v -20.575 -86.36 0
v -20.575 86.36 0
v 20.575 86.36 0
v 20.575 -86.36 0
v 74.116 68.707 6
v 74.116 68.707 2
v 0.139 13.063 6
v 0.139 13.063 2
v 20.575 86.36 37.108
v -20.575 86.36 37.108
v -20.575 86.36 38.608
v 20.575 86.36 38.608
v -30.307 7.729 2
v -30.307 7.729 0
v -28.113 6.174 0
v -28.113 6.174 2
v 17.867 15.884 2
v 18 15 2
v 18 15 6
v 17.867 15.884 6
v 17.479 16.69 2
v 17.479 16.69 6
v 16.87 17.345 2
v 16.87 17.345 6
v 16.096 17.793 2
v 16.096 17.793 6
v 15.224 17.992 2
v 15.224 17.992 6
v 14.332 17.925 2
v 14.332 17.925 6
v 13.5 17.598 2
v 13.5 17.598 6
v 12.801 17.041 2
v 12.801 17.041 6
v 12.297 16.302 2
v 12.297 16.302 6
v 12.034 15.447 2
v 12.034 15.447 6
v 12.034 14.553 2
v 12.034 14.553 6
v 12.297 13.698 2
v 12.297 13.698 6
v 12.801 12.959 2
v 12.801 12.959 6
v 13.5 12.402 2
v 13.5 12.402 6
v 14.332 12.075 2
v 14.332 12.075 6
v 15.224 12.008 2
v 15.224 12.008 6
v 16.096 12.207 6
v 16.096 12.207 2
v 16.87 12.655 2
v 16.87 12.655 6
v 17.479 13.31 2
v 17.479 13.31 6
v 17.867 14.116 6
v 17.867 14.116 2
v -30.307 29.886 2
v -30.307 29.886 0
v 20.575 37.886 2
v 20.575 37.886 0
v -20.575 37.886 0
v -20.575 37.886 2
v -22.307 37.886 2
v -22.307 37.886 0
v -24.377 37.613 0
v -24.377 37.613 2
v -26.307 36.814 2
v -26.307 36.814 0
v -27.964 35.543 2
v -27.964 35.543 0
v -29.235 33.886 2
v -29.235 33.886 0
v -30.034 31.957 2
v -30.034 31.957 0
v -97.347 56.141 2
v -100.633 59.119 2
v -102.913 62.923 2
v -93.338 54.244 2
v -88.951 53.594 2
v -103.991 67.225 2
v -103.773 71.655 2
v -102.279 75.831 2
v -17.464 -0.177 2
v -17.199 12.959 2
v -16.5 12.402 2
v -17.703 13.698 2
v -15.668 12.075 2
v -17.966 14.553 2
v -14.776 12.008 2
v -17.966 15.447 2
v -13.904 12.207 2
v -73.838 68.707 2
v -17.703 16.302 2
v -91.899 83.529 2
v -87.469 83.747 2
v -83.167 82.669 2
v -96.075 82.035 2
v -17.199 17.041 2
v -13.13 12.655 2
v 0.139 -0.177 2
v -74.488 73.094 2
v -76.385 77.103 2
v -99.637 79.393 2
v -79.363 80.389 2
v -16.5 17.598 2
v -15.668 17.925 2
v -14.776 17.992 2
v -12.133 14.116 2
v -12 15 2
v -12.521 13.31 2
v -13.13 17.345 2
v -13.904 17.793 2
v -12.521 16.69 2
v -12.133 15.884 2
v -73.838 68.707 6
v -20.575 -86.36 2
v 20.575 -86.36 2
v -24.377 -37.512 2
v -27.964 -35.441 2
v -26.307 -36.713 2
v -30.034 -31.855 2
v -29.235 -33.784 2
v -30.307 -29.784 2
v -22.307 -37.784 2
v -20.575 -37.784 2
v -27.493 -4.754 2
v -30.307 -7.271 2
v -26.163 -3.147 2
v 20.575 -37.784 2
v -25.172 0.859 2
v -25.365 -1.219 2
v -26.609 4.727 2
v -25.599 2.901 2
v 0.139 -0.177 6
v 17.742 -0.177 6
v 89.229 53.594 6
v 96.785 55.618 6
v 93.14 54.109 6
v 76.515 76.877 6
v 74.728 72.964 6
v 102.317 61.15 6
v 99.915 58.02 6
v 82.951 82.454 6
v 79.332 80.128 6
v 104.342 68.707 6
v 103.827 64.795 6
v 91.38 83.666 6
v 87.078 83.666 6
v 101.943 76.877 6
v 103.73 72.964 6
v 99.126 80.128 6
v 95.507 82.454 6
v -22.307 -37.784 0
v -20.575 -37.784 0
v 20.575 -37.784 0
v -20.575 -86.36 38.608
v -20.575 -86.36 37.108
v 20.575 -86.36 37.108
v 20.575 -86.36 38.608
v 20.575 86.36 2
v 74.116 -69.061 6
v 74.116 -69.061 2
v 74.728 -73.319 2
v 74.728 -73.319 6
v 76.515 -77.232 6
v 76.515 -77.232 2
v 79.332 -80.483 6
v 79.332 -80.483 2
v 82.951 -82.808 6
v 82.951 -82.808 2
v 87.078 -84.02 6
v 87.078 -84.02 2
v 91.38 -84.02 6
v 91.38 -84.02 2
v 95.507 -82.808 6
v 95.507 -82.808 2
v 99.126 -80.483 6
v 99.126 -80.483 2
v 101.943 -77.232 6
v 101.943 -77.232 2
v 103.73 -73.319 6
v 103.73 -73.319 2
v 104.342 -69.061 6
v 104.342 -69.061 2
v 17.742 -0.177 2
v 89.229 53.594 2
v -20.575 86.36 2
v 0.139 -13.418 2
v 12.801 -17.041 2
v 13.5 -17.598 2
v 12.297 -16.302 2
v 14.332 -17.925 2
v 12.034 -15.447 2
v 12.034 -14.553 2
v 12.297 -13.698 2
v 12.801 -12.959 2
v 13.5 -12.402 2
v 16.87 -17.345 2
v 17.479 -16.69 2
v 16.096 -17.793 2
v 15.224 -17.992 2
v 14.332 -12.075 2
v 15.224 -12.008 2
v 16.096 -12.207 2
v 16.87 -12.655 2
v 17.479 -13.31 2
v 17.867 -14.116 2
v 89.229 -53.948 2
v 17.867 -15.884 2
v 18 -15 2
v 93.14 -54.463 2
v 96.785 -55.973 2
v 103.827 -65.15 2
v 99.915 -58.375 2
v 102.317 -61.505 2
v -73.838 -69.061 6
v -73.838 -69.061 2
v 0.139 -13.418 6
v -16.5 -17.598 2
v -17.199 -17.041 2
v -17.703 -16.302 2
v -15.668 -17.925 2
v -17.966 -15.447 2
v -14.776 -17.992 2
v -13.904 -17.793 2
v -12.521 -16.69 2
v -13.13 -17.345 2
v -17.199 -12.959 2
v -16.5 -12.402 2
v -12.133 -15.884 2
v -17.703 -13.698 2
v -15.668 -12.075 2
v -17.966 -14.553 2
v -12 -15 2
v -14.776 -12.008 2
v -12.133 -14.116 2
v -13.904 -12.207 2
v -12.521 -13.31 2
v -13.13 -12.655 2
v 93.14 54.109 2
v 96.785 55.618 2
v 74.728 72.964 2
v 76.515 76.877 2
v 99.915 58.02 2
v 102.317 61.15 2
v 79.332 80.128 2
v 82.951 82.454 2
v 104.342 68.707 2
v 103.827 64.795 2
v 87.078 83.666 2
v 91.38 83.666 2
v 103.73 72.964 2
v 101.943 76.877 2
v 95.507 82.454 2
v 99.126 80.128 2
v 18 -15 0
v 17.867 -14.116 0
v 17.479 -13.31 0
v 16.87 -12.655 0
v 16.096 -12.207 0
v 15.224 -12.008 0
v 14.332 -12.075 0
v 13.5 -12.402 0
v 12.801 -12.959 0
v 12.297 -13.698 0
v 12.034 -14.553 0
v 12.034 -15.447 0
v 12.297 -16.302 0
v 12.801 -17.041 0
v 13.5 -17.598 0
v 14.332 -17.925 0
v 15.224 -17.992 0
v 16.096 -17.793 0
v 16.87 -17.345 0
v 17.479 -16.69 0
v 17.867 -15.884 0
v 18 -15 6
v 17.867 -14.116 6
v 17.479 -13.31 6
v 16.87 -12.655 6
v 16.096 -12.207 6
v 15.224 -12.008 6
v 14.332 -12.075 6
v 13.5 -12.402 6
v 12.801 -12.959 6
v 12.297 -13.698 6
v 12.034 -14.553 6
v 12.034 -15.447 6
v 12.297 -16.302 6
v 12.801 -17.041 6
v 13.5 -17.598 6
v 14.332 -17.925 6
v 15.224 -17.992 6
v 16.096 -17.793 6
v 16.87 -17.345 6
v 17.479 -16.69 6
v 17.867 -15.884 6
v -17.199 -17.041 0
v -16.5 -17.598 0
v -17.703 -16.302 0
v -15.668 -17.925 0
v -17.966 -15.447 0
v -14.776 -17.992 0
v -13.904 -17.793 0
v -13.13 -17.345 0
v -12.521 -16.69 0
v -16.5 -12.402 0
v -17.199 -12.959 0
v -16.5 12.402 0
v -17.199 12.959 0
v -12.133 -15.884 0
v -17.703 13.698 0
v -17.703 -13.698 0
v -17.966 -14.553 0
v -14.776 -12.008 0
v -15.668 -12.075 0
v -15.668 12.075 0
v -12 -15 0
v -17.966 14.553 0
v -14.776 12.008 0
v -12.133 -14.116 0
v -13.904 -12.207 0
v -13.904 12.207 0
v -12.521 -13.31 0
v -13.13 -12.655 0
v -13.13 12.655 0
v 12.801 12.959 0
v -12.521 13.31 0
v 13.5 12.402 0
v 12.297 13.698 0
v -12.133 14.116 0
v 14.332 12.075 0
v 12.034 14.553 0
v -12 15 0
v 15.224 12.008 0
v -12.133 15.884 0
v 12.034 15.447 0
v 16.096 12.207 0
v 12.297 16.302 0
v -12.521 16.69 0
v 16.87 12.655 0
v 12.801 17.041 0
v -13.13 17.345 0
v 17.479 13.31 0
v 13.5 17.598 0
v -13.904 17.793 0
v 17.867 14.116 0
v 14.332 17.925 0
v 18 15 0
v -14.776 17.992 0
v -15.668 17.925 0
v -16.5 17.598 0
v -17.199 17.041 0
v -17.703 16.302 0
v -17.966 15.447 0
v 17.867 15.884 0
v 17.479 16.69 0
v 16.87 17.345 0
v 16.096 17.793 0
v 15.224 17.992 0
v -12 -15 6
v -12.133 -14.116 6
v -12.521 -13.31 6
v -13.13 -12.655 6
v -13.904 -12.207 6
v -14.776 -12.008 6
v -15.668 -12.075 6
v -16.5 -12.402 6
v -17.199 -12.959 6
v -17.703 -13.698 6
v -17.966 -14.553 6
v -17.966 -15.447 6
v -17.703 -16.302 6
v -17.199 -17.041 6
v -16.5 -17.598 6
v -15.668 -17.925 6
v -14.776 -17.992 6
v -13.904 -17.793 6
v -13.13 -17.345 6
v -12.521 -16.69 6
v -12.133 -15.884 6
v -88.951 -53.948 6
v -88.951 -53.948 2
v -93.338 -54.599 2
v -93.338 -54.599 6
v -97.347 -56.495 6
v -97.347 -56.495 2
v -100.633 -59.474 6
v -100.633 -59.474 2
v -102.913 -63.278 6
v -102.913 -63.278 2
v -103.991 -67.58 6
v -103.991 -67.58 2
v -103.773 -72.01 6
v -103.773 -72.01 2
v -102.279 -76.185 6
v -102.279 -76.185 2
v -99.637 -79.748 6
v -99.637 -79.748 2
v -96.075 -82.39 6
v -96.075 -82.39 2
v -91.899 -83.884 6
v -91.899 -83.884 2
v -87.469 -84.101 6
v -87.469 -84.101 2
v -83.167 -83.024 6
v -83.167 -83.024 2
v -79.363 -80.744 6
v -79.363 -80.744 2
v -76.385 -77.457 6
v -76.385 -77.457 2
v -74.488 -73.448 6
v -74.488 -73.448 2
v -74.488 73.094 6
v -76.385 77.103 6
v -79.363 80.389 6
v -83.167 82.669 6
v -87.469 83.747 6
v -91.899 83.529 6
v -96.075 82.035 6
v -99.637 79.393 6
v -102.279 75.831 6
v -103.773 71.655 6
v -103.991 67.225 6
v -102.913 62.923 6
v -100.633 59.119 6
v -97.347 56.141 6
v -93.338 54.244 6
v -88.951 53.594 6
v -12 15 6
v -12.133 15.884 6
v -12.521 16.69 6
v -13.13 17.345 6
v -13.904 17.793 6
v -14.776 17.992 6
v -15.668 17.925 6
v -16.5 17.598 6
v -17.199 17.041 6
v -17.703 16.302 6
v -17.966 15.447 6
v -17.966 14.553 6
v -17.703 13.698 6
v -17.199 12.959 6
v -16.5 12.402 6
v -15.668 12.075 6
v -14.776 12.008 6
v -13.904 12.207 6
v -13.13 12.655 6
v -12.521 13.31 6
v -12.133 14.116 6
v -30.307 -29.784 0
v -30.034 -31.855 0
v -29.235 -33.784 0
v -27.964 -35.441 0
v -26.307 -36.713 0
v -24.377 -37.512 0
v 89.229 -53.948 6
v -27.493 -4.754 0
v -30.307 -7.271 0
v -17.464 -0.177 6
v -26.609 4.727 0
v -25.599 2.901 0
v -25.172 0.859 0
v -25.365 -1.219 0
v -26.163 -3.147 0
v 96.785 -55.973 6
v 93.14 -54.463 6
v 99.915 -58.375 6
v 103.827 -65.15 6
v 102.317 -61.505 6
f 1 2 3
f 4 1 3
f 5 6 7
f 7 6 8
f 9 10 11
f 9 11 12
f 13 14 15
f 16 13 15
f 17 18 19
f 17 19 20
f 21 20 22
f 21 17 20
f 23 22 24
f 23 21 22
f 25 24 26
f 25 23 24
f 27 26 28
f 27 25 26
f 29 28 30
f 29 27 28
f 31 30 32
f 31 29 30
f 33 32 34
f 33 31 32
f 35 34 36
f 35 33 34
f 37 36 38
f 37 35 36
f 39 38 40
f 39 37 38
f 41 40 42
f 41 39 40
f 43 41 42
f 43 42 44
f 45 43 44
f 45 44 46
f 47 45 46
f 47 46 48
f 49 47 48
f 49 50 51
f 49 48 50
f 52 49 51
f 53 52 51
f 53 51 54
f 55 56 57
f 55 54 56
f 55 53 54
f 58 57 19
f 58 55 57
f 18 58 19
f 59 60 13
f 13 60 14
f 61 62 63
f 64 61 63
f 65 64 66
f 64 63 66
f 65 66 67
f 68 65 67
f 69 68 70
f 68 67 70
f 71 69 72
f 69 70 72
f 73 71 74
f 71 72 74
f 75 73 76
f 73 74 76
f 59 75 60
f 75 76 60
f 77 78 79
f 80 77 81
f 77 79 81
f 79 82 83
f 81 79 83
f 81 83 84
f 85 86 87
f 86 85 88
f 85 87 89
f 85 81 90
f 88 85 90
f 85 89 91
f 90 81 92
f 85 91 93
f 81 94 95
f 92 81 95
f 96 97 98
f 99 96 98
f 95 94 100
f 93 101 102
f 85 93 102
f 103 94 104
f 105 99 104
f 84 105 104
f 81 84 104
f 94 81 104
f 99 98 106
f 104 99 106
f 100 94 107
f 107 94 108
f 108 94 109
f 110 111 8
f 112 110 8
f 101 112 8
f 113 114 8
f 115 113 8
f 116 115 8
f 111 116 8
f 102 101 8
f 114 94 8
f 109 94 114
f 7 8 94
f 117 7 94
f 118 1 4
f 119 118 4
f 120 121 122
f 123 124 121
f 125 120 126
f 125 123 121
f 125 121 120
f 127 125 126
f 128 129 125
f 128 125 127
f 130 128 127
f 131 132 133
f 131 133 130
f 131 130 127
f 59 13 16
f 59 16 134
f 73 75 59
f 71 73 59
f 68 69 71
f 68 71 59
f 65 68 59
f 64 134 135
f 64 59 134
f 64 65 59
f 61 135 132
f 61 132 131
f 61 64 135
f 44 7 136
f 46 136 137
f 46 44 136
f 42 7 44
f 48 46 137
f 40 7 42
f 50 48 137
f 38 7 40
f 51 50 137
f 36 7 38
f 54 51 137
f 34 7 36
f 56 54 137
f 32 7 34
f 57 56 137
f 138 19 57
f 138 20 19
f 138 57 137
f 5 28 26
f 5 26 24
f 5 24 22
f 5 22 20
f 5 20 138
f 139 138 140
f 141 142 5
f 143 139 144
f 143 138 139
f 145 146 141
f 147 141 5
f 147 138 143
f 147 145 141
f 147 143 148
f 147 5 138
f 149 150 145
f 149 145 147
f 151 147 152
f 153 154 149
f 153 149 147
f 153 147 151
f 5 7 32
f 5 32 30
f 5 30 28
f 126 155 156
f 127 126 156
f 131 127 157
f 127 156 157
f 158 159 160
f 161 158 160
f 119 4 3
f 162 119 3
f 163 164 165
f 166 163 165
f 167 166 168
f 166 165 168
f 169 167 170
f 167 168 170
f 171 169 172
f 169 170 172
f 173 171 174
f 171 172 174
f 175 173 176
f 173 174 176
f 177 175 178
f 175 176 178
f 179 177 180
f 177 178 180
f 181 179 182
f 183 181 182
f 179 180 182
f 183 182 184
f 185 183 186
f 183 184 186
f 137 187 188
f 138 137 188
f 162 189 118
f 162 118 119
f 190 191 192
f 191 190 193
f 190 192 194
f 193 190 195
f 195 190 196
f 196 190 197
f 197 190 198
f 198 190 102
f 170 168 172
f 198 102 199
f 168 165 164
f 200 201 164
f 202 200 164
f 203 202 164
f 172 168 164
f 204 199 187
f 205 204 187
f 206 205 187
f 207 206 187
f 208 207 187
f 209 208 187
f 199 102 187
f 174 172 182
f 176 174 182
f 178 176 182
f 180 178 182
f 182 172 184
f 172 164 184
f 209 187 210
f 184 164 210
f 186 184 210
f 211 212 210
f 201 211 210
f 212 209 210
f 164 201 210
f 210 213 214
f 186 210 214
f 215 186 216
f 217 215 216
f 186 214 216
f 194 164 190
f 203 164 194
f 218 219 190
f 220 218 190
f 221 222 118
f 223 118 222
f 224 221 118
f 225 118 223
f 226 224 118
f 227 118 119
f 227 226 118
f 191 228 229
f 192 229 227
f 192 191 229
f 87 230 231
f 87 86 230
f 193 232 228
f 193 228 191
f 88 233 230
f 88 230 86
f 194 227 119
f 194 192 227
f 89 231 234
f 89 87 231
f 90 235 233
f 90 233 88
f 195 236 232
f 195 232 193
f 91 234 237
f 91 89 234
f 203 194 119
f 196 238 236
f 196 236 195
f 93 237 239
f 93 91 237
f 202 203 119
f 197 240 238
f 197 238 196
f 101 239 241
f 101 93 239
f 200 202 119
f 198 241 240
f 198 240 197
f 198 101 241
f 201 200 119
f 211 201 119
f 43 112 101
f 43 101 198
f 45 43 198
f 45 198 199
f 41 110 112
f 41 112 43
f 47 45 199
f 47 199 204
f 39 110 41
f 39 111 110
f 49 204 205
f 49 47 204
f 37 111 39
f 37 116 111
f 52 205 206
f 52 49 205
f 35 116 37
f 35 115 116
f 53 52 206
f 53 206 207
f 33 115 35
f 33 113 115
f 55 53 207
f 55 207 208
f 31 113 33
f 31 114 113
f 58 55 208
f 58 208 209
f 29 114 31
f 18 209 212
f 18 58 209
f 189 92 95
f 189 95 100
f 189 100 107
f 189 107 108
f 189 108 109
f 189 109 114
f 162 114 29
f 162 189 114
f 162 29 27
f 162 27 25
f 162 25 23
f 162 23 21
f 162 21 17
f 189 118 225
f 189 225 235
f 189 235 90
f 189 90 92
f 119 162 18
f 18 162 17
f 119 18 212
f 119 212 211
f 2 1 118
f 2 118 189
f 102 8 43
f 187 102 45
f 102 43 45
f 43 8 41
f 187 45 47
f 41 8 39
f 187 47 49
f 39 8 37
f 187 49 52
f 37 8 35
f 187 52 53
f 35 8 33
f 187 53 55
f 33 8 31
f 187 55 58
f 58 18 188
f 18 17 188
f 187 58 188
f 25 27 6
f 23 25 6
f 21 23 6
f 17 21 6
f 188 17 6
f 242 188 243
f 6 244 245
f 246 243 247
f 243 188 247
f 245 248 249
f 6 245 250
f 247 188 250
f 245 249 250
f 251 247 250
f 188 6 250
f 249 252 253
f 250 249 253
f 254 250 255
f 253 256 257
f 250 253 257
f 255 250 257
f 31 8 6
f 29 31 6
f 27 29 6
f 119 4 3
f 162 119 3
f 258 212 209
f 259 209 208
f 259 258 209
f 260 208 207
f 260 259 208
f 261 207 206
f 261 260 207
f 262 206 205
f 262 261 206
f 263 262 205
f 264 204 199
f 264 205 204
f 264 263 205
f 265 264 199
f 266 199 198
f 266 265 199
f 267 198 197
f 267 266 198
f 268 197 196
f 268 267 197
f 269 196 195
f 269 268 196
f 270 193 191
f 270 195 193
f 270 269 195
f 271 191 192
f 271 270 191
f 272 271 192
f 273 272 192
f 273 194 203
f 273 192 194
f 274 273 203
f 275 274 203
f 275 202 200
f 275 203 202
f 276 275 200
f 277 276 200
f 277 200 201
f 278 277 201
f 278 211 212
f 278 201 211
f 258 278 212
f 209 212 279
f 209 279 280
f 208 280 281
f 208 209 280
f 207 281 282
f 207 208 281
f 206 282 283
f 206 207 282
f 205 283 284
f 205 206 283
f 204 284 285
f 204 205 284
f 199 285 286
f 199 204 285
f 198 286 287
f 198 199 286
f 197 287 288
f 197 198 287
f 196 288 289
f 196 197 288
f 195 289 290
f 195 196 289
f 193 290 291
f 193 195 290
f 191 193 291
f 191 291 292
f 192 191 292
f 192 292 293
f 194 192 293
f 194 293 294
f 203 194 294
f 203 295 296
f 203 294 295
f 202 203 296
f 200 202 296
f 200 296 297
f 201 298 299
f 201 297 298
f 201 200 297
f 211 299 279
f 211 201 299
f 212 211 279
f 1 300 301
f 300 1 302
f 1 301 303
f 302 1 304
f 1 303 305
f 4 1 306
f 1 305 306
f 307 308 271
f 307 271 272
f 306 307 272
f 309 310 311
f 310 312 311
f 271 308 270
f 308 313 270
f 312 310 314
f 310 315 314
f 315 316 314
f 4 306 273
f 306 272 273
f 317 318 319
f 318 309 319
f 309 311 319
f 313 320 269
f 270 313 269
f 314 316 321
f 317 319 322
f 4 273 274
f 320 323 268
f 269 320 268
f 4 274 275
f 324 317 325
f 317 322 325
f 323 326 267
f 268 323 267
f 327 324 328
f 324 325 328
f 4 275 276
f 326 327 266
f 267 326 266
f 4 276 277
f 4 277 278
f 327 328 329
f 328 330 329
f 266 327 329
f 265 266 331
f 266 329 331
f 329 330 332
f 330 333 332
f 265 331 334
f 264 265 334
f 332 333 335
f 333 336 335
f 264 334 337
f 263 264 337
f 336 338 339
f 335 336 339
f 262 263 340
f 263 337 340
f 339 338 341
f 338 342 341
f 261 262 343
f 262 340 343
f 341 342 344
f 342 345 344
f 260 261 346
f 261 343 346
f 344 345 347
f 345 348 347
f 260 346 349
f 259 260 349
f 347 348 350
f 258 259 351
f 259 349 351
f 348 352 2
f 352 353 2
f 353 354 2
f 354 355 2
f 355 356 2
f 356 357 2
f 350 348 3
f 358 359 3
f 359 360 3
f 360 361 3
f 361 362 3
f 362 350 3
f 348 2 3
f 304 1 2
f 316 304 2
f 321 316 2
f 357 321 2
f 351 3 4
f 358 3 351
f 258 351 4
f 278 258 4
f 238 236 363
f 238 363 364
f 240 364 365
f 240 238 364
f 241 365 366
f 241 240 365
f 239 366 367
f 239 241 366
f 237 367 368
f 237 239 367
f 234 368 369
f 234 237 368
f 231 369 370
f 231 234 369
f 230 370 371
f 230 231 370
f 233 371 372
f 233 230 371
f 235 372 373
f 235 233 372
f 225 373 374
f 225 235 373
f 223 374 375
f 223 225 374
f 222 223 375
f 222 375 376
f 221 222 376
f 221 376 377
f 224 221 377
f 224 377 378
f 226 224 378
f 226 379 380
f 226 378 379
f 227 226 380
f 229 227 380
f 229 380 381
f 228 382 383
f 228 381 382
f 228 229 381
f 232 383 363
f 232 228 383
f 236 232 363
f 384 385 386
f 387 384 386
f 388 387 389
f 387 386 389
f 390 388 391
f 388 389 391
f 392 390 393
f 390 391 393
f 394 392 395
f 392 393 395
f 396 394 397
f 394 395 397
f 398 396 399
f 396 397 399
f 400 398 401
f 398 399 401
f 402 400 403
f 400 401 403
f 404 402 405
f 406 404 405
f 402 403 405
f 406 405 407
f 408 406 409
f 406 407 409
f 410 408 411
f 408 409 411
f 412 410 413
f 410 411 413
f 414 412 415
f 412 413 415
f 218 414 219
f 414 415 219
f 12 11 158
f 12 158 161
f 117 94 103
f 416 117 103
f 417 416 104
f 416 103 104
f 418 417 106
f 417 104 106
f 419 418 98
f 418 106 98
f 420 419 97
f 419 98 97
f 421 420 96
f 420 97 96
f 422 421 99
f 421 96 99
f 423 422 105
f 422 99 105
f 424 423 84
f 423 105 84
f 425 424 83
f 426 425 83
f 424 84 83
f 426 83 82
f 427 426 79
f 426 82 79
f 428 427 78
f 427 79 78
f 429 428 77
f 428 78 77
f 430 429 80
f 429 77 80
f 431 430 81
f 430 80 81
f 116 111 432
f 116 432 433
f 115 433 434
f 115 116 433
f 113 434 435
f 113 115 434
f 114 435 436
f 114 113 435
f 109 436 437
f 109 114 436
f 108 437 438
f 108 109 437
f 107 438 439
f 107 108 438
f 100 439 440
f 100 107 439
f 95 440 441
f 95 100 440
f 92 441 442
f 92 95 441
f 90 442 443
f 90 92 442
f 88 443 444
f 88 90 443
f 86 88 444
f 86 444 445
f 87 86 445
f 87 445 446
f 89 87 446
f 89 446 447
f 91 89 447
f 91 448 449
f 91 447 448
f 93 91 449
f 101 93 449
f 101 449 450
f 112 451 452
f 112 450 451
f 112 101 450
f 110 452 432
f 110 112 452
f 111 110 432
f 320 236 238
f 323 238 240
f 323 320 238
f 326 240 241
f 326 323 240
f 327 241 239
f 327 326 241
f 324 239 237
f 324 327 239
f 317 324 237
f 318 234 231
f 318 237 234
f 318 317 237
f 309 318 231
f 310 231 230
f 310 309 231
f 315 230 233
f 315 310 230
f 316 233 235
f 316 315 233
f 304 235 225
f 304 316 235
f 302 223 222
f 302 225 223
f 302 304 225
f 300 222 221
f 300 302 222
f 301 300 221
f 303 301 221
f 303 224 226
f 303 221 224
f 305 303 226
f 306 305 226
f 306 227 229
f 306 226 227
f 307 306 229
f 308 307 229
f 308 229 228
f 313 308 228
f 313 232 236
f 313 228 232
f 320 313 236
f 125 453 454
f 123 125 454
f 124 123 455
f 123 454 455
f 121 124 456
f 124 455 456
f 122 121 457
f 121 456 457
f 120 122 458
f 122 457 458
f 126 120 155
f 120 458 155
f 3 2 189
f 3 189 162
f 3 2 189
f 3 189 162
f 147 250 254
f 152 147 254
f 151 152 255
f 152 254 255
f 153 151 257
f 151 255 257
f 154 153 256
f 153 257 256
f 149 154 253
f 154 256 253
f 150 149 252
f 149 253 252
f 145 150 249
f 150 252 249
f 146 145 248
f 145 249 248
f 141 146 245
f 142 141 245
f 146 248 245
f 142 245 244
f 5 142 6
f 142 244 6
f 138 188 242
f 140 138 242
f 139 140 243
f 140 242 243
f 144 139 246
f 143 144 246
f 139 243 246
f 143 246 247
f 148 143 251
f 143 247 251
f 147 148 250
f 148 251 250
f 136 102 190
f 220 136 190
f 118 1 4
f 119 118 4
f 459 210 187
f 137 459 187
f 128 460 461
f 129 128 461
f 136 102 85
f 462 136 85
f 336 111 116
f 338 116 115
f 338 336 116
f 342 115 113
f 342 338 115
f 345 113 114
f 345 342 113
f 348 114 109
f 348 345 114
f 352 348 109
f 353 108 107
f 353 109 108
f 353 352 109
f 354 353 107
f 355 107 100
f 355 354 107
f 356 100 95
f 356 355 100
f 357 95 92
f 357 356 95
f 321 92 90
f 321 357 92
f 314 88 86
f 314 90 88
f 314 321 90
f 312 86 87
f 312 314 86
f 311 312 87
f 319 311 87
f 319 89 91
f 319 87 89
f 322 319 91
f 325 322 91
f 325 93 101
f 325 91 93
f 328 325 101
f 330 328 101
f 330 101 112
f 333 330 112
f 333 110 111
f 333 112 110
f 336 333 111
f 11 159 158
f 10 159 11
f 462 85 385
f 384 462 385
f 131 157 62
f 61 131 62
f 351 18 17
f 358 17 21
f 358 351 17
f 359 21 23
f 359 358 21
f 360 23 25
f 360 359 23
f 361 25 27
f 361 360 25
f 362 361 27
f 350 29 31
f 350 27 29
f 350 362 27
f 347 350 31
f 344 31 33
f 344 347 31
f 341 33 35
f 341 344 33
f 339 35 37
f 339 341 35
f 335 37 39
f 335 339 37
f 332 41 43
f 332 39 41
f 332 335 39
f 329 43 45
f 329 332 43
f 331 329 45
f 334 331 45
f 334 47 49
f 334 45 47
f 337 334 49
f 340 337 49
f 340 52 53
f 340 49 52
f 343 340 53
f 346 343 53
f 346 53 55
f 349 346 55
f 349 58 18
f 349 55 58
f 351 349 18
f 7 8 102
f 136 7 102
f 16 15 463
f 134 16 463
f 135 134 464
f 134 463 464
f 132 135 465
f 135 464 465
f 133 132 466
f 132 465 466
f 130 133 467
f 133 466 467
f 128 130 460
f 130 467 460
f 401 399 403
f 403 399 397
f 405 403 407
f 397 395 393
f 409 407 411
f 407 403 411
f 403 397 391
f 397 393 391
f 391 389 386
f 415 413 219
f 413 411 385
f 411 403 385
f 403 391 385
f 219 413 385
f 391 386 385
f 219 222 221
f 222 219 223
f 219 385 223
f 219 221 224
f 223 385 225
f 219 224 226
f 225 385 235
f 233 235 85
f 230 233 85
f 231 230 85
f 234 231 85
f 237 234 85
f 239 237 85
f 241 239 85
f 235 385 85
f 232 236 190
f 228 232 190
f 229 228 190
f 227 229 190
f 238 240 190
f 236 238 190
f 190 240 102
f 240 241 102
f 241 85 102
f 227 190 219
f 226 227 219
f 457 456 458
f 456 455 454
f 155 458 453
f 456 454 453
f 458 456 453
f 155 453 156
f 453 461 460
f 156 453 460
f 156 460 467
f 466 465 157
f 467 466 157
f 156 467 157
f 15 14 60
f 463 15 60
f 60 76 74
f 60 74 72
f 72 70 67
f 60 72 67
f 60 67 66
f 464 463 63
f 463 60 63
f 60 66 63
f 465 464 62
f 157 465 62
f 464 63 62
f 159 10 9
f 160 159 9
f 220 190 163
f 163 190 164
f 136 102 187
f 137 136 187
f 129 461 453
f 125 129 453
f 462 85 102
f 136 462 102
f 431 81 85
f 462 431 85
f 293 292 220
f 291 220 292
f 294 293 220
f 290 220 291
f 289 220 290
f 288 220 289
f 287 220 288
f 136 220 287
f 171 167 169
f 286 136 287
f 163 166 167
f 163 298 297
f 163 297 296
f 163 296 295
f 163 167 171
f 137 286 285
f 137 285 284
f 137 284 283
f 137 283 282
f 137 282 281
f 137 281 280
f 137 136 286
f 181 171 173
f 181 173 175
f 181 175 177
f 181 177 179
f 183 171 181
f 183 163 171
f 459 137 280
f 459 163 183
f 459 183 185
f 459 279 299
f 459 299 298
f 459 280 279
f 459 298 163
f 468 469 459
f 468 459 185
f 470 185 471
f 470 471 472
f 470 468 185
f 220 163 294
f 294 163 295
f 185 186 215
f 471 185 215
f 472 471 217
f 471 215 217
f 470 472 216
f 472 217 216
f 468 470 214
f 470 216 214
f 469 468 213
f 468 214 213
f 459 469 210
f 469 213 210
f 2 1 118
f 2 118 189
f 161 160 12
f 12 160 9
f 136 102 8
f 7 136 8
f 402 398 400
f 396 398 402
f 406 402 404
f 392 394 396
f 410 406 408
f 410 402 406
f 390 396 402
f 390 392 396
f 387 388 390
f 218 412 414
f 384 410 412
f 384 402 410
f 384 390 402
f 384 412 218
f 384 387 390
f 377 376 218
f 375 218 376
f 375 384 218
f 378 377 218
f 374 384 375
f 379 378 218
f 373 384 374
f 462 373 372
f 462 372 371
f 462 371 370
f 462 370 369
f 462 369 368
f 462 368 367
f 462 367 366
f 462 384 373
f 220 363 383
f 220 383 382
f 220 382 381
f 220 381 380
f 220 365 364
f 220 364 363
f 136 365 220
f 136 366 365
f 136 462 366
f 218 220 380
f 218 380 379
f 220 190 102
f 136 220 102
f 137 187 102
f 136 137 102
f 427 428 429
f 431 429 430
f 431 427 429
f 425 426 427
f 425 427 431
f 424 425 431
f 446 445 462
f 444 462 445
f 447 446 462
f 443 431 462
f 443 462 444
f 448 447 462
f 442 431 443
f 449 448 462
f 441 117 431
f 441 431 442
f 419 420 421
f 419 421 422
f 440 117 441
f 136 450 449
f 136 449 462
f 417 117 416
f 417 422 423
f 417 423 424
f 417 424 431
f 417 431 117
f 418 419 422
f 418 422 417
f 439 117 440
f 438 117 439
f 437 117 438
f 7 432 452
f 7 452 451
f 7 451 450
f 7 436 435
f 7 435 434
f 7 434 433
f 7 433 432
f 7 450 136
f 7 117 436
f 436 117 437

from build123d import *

# Parameters (mm, degrees)
F0_W           = 41.15
F0_H           = 172.72
F1_DEPTH       = 2
F3_START       = 2
F3_DEPTH       = 4
F4_START       = 2
F4_DEPTH       = 4
F5_START       = 2
F5_DEPTH       = 4
F6_START       = 2
F6_DEPTH       = 4
F8_START       = 37.108
F7_W           = 41.15
F7_H           = 172.72
F8_DEPTH       = 1.5
F9_R           = 3
F10_DEPTH      = 2
F10_DEPTH_BACK = 8
F11_W          = 41.15
F11_H          = 75.6703085505
F12_DEPTH      = 2


# Not quite as in the source:
# - a feature names something its author has since deleted; it is built from what else it names


with BuildPart() as f1:
    # F0 (on Top) → F1 (new body)
    with BuildSketch(Plane.XY):
        Rectangle(F0_W, F0_H)
    extrude(amount=F1_DEPTH)


with BuildPart() as f3:
    # F2 (on Top) → F3 (new body)
    with BuildSketch(Plane.XY.offset(F3_START)):
        Polygon((0.1391619444, -0.1772679389), (-17.4635283139, -0.1772679389), (0.1391619444, -13.4175834731), align=None)
        with BuildLine():
            Line((0.1391619444, -13.4175834731), (-17.4635283139, -0.1772679389))
            Line((-17.4635283139, -0.1772679389), (-88.9506042004, -53.9481079335))
            ThreePointArc((-88.9506042004, -53.9481079335), (-78.2640994163, -58.3746031494), (-73.8376042004, -69.0611079335))
            Line((-73.8376042004, -69.0611079335), (0.1391619444, -13.4175834731))
        make_face()
        with BuildLine():
            ThreePointArc((-73.8376042004, -69.0611079335), (-78.2640994163, -58.3746031494), (-88.9506042004, -53.9481079335))
            ThreePointArc((-88.9506042004, -53.9481079335), (-99.6371089844, -79.7476127176), (-73.8376042004, -69.0611079335))
        make_face()
    extrude(amount=F3_DEPTH)


with BuildPart() as f4:
    # F2 (on Top) → F4 (new body)
    with BuildSketch(Plane.XY.offset(F4_START)):
        with BuildLine():
            ThreePointArc((104.3419280891, -69.0611079335), (99.9154328732, -58.3746031494), (89.2289280891, -53.9481079335))
            ThreePointArc((89.2289280891, -53.9481079335), (78.5424233051, -58.3746031494), (74.1159280891, -69.0611079335))
            ThreePointArc((74.1159280891, -69.0611079335), (89.2289280891, -84.1741079335), (104.3419280891, -69.0611079335))
        make_face()
        with BuildLine():
            Line((89.2289280891, -53.9481079335), (17.7418522027, -0.1772679389))
            Line((17.7418522027, -0.1772679389), (0.1391619444, -13.4175834731))
            Line((0.1391619444, -13.4175834731), (74.1159280891, -69.0611079335))
            ThreePointArc((74.1159280891, -69.0611079335), (78.5424233051, -58.3746031494), (89.2289280891, -53.9481079335))
        make_face()
        Polygon((0.1391619444, -13.4175834731), (17.7418522027, -0.1772679389), (0.1391619444, -0.1772679389), align=None)
    extrude(amount=F4_DEPTH)


with BuildPart() as f5:
    # F2 (on Top) → F5 (new body)
    with BuildSketch(Plane.XY.offset(F5_START)):
        with BuildLine():
            ThreePointArc((104.3419280891, 68.7065720558), (89.2289280891, 83.8195720558), (74.1159280891, 68.7065720558))
            ThreePointArc((74.1159280891, 68.7065720558), (78.5424233051, 58.0200672717), (89.2289280891, 53.5935720558))
            ThreePointArc((89.2289280891, 53.5935720558), (99.9154328732, 58.0200672717), (104.3419280891, 68.7065720558))
        make_face()
        with BuildLine():
            Line((74.1159280891, 68.7065720558), (0.1391619444, 13.0630475954))
            Line((0.1391619444, 13.0630475954), (17.7418522027, -0.1772679389))
            Line((17.7418522027, -0.1772679389), (89.2289280891, 53.5935720558))
            ThreePointArc((89.2289280891, 53.5935720558), (78.5424233051, 58.0200672717), (74.1159280891, 68.7065720558))
        make_face()
        Polygon((17.7418522027, -0.1772679389), (0.1391619444, 13.0630475954), (0.1391619444, -0.1772679389), align=None)
    extrude(amount=F5_DEPTH)


with BuildPart() as f6:
    # F2 (on Top) → F6 (new body)
    with BuildSketch(Plane.XY.offset(F6_START)):
        with BuildLine():
            ThreePointArc((-88.9506042004, 53.5935720558), (-78.2640994163, 58.0200672717), (-73.8376042004, 68.7065720558))
            ThreePointArc((-73.8376042004, 68.7065720558), (-99.6371089844, 79.3930768399), (-88.9506042004, 53.5935720558))
        make_face()
        with BuildLine():
            Line((0.1391619444, 13.0630475954), (-73.8376042004, 68.7065720558))
            ThreePointArc((-73.8376042004, 68.7065720558), (-78.2640994163, 58.0200672717), (-88.9506042004, 53.5935720558))
            Line((-88.9506042004, 53.5935720558), (-17.4635283139, -0.1772679389))
            Line((-17.4635283139, -0.1772679389), (0.1391619444, 13.0630475954))
        make_face()
        Polygon((0.1391619444, -0.1772679389), (0.1391619444, 13.0630475954), (-17.4635283139, -0.1772679389), align=None)
    extrude(amount=F6_DEPTH)


with BuildPart() as f8:
    # F7 (on Top) → F8 (new body)
    with BuildSketch(Plane.XY.offset(F8_START)):
        Rectangle(F7_W, F7_H)
    extrude(amount=F8_DEPTH)


with BuildPart() as f10_tool:
    # F9 (on face) → F10 (new body, two sides)
    with BuildSketch(Plane.XY) as f10_sk:
        with Locations((15, 15)):
            Circle(F9_R)
        with Locations((15, -15)):
            Circle(F9_R)
        with Locations((-15, -15)):
            Circle(F9_R)
        with Locations((-15, 15)):
            Circle(F9_R)
    extrude(amount=-F10_DEPTH)
    extrude(f10_sk.sketch, amount=F10_DEPTH_BACK)


with BuildPart() as f1_1:
    add(f1.part)

    # F10: cut by f10_tool
    add(f10_tool.part, mode=Mode.SUBTRACT)


with BuildPart() as f3_1:
    add(f3.part)

    # F10: cut by f10_tool
    add(f10_tool.part, mode=Mode.SUBTRACT)


with BuildPart() as f4_1:
    add(f4.part)

    # F10: cut by f10_tool
    add(f10_tool.part, mode=Mode.SUBTRACT)


with BuildPart() as f5_1:
    add(f5.part)

    # F10: cut by f10_tool
    add(f10_tool.part, mode=Mode.SUBTRACT)


with BuildPart() as f6_1:
    add(f6.part)

    # F10: cut by f10_tool
    add(f10_tool.part, mode=Mode.SUBTRACT)


with BuildPart() as f12:
    # F11 (on face) → F12 (new body)
    with BuildSketch(Plane.XY):
        with BuildLine():
            Line((-20.575, 37.8859647318), (-22.3068072487, 37.8859647318))
            ThreePointArc((-22.3068072487, 37.8859647318), (-27.9636614982, 35.5428189813), (-30.3068072487, 29.8859647318))
            Line((-30.3068072487, 29.8859647318), (-30.3068072487, 7.7289344695))
            Line((-30.3068072487, 7.7289344695), (-28.1127241634, 6.173899075))
            ThreePointArc((-28.1127241634, 6.173899075), (-25.1716069065, 0.8588809734), (-27.4934151644, -4.7543885332))
            Line((-27.4934151644, -4.7543885332), (-30.3068072487, -7.2710655305))
            Line((-30.3068072487, -7.2710655305), (-30.3068072487, -29.7843438187))
            ThreePointArc((-30.3068072487, -29.7843438187), (-27.9636614982, -35.4411980681), (-22.3068072487, -37.7843438187))
            Line((-22.3068072487, -37.7843438187), (-20.575, -37.7843438187))
            Line((-20.575, -37.7843438187), (-20.575, 37.8859647318))
        make_face()
        with Locations((0, 0.0508104566)):
            Rectangle(F11_W, F11_H)
    extrude(amount=F12_DEPTH)


with BuildPart() as f12b:
    # F0 (on Top) → F12, piece 2 (new body)
    with BuildSketch(Plane.XY):
        Rectangle(F0_W, F0_H)
    extrude(amount=F12_DEPTH)


solid = Compound([f8.part, f1_1.part, f3_1.part, f4_1.part, f5_1.part, f6_1.part, f12.part, f12b.part])
